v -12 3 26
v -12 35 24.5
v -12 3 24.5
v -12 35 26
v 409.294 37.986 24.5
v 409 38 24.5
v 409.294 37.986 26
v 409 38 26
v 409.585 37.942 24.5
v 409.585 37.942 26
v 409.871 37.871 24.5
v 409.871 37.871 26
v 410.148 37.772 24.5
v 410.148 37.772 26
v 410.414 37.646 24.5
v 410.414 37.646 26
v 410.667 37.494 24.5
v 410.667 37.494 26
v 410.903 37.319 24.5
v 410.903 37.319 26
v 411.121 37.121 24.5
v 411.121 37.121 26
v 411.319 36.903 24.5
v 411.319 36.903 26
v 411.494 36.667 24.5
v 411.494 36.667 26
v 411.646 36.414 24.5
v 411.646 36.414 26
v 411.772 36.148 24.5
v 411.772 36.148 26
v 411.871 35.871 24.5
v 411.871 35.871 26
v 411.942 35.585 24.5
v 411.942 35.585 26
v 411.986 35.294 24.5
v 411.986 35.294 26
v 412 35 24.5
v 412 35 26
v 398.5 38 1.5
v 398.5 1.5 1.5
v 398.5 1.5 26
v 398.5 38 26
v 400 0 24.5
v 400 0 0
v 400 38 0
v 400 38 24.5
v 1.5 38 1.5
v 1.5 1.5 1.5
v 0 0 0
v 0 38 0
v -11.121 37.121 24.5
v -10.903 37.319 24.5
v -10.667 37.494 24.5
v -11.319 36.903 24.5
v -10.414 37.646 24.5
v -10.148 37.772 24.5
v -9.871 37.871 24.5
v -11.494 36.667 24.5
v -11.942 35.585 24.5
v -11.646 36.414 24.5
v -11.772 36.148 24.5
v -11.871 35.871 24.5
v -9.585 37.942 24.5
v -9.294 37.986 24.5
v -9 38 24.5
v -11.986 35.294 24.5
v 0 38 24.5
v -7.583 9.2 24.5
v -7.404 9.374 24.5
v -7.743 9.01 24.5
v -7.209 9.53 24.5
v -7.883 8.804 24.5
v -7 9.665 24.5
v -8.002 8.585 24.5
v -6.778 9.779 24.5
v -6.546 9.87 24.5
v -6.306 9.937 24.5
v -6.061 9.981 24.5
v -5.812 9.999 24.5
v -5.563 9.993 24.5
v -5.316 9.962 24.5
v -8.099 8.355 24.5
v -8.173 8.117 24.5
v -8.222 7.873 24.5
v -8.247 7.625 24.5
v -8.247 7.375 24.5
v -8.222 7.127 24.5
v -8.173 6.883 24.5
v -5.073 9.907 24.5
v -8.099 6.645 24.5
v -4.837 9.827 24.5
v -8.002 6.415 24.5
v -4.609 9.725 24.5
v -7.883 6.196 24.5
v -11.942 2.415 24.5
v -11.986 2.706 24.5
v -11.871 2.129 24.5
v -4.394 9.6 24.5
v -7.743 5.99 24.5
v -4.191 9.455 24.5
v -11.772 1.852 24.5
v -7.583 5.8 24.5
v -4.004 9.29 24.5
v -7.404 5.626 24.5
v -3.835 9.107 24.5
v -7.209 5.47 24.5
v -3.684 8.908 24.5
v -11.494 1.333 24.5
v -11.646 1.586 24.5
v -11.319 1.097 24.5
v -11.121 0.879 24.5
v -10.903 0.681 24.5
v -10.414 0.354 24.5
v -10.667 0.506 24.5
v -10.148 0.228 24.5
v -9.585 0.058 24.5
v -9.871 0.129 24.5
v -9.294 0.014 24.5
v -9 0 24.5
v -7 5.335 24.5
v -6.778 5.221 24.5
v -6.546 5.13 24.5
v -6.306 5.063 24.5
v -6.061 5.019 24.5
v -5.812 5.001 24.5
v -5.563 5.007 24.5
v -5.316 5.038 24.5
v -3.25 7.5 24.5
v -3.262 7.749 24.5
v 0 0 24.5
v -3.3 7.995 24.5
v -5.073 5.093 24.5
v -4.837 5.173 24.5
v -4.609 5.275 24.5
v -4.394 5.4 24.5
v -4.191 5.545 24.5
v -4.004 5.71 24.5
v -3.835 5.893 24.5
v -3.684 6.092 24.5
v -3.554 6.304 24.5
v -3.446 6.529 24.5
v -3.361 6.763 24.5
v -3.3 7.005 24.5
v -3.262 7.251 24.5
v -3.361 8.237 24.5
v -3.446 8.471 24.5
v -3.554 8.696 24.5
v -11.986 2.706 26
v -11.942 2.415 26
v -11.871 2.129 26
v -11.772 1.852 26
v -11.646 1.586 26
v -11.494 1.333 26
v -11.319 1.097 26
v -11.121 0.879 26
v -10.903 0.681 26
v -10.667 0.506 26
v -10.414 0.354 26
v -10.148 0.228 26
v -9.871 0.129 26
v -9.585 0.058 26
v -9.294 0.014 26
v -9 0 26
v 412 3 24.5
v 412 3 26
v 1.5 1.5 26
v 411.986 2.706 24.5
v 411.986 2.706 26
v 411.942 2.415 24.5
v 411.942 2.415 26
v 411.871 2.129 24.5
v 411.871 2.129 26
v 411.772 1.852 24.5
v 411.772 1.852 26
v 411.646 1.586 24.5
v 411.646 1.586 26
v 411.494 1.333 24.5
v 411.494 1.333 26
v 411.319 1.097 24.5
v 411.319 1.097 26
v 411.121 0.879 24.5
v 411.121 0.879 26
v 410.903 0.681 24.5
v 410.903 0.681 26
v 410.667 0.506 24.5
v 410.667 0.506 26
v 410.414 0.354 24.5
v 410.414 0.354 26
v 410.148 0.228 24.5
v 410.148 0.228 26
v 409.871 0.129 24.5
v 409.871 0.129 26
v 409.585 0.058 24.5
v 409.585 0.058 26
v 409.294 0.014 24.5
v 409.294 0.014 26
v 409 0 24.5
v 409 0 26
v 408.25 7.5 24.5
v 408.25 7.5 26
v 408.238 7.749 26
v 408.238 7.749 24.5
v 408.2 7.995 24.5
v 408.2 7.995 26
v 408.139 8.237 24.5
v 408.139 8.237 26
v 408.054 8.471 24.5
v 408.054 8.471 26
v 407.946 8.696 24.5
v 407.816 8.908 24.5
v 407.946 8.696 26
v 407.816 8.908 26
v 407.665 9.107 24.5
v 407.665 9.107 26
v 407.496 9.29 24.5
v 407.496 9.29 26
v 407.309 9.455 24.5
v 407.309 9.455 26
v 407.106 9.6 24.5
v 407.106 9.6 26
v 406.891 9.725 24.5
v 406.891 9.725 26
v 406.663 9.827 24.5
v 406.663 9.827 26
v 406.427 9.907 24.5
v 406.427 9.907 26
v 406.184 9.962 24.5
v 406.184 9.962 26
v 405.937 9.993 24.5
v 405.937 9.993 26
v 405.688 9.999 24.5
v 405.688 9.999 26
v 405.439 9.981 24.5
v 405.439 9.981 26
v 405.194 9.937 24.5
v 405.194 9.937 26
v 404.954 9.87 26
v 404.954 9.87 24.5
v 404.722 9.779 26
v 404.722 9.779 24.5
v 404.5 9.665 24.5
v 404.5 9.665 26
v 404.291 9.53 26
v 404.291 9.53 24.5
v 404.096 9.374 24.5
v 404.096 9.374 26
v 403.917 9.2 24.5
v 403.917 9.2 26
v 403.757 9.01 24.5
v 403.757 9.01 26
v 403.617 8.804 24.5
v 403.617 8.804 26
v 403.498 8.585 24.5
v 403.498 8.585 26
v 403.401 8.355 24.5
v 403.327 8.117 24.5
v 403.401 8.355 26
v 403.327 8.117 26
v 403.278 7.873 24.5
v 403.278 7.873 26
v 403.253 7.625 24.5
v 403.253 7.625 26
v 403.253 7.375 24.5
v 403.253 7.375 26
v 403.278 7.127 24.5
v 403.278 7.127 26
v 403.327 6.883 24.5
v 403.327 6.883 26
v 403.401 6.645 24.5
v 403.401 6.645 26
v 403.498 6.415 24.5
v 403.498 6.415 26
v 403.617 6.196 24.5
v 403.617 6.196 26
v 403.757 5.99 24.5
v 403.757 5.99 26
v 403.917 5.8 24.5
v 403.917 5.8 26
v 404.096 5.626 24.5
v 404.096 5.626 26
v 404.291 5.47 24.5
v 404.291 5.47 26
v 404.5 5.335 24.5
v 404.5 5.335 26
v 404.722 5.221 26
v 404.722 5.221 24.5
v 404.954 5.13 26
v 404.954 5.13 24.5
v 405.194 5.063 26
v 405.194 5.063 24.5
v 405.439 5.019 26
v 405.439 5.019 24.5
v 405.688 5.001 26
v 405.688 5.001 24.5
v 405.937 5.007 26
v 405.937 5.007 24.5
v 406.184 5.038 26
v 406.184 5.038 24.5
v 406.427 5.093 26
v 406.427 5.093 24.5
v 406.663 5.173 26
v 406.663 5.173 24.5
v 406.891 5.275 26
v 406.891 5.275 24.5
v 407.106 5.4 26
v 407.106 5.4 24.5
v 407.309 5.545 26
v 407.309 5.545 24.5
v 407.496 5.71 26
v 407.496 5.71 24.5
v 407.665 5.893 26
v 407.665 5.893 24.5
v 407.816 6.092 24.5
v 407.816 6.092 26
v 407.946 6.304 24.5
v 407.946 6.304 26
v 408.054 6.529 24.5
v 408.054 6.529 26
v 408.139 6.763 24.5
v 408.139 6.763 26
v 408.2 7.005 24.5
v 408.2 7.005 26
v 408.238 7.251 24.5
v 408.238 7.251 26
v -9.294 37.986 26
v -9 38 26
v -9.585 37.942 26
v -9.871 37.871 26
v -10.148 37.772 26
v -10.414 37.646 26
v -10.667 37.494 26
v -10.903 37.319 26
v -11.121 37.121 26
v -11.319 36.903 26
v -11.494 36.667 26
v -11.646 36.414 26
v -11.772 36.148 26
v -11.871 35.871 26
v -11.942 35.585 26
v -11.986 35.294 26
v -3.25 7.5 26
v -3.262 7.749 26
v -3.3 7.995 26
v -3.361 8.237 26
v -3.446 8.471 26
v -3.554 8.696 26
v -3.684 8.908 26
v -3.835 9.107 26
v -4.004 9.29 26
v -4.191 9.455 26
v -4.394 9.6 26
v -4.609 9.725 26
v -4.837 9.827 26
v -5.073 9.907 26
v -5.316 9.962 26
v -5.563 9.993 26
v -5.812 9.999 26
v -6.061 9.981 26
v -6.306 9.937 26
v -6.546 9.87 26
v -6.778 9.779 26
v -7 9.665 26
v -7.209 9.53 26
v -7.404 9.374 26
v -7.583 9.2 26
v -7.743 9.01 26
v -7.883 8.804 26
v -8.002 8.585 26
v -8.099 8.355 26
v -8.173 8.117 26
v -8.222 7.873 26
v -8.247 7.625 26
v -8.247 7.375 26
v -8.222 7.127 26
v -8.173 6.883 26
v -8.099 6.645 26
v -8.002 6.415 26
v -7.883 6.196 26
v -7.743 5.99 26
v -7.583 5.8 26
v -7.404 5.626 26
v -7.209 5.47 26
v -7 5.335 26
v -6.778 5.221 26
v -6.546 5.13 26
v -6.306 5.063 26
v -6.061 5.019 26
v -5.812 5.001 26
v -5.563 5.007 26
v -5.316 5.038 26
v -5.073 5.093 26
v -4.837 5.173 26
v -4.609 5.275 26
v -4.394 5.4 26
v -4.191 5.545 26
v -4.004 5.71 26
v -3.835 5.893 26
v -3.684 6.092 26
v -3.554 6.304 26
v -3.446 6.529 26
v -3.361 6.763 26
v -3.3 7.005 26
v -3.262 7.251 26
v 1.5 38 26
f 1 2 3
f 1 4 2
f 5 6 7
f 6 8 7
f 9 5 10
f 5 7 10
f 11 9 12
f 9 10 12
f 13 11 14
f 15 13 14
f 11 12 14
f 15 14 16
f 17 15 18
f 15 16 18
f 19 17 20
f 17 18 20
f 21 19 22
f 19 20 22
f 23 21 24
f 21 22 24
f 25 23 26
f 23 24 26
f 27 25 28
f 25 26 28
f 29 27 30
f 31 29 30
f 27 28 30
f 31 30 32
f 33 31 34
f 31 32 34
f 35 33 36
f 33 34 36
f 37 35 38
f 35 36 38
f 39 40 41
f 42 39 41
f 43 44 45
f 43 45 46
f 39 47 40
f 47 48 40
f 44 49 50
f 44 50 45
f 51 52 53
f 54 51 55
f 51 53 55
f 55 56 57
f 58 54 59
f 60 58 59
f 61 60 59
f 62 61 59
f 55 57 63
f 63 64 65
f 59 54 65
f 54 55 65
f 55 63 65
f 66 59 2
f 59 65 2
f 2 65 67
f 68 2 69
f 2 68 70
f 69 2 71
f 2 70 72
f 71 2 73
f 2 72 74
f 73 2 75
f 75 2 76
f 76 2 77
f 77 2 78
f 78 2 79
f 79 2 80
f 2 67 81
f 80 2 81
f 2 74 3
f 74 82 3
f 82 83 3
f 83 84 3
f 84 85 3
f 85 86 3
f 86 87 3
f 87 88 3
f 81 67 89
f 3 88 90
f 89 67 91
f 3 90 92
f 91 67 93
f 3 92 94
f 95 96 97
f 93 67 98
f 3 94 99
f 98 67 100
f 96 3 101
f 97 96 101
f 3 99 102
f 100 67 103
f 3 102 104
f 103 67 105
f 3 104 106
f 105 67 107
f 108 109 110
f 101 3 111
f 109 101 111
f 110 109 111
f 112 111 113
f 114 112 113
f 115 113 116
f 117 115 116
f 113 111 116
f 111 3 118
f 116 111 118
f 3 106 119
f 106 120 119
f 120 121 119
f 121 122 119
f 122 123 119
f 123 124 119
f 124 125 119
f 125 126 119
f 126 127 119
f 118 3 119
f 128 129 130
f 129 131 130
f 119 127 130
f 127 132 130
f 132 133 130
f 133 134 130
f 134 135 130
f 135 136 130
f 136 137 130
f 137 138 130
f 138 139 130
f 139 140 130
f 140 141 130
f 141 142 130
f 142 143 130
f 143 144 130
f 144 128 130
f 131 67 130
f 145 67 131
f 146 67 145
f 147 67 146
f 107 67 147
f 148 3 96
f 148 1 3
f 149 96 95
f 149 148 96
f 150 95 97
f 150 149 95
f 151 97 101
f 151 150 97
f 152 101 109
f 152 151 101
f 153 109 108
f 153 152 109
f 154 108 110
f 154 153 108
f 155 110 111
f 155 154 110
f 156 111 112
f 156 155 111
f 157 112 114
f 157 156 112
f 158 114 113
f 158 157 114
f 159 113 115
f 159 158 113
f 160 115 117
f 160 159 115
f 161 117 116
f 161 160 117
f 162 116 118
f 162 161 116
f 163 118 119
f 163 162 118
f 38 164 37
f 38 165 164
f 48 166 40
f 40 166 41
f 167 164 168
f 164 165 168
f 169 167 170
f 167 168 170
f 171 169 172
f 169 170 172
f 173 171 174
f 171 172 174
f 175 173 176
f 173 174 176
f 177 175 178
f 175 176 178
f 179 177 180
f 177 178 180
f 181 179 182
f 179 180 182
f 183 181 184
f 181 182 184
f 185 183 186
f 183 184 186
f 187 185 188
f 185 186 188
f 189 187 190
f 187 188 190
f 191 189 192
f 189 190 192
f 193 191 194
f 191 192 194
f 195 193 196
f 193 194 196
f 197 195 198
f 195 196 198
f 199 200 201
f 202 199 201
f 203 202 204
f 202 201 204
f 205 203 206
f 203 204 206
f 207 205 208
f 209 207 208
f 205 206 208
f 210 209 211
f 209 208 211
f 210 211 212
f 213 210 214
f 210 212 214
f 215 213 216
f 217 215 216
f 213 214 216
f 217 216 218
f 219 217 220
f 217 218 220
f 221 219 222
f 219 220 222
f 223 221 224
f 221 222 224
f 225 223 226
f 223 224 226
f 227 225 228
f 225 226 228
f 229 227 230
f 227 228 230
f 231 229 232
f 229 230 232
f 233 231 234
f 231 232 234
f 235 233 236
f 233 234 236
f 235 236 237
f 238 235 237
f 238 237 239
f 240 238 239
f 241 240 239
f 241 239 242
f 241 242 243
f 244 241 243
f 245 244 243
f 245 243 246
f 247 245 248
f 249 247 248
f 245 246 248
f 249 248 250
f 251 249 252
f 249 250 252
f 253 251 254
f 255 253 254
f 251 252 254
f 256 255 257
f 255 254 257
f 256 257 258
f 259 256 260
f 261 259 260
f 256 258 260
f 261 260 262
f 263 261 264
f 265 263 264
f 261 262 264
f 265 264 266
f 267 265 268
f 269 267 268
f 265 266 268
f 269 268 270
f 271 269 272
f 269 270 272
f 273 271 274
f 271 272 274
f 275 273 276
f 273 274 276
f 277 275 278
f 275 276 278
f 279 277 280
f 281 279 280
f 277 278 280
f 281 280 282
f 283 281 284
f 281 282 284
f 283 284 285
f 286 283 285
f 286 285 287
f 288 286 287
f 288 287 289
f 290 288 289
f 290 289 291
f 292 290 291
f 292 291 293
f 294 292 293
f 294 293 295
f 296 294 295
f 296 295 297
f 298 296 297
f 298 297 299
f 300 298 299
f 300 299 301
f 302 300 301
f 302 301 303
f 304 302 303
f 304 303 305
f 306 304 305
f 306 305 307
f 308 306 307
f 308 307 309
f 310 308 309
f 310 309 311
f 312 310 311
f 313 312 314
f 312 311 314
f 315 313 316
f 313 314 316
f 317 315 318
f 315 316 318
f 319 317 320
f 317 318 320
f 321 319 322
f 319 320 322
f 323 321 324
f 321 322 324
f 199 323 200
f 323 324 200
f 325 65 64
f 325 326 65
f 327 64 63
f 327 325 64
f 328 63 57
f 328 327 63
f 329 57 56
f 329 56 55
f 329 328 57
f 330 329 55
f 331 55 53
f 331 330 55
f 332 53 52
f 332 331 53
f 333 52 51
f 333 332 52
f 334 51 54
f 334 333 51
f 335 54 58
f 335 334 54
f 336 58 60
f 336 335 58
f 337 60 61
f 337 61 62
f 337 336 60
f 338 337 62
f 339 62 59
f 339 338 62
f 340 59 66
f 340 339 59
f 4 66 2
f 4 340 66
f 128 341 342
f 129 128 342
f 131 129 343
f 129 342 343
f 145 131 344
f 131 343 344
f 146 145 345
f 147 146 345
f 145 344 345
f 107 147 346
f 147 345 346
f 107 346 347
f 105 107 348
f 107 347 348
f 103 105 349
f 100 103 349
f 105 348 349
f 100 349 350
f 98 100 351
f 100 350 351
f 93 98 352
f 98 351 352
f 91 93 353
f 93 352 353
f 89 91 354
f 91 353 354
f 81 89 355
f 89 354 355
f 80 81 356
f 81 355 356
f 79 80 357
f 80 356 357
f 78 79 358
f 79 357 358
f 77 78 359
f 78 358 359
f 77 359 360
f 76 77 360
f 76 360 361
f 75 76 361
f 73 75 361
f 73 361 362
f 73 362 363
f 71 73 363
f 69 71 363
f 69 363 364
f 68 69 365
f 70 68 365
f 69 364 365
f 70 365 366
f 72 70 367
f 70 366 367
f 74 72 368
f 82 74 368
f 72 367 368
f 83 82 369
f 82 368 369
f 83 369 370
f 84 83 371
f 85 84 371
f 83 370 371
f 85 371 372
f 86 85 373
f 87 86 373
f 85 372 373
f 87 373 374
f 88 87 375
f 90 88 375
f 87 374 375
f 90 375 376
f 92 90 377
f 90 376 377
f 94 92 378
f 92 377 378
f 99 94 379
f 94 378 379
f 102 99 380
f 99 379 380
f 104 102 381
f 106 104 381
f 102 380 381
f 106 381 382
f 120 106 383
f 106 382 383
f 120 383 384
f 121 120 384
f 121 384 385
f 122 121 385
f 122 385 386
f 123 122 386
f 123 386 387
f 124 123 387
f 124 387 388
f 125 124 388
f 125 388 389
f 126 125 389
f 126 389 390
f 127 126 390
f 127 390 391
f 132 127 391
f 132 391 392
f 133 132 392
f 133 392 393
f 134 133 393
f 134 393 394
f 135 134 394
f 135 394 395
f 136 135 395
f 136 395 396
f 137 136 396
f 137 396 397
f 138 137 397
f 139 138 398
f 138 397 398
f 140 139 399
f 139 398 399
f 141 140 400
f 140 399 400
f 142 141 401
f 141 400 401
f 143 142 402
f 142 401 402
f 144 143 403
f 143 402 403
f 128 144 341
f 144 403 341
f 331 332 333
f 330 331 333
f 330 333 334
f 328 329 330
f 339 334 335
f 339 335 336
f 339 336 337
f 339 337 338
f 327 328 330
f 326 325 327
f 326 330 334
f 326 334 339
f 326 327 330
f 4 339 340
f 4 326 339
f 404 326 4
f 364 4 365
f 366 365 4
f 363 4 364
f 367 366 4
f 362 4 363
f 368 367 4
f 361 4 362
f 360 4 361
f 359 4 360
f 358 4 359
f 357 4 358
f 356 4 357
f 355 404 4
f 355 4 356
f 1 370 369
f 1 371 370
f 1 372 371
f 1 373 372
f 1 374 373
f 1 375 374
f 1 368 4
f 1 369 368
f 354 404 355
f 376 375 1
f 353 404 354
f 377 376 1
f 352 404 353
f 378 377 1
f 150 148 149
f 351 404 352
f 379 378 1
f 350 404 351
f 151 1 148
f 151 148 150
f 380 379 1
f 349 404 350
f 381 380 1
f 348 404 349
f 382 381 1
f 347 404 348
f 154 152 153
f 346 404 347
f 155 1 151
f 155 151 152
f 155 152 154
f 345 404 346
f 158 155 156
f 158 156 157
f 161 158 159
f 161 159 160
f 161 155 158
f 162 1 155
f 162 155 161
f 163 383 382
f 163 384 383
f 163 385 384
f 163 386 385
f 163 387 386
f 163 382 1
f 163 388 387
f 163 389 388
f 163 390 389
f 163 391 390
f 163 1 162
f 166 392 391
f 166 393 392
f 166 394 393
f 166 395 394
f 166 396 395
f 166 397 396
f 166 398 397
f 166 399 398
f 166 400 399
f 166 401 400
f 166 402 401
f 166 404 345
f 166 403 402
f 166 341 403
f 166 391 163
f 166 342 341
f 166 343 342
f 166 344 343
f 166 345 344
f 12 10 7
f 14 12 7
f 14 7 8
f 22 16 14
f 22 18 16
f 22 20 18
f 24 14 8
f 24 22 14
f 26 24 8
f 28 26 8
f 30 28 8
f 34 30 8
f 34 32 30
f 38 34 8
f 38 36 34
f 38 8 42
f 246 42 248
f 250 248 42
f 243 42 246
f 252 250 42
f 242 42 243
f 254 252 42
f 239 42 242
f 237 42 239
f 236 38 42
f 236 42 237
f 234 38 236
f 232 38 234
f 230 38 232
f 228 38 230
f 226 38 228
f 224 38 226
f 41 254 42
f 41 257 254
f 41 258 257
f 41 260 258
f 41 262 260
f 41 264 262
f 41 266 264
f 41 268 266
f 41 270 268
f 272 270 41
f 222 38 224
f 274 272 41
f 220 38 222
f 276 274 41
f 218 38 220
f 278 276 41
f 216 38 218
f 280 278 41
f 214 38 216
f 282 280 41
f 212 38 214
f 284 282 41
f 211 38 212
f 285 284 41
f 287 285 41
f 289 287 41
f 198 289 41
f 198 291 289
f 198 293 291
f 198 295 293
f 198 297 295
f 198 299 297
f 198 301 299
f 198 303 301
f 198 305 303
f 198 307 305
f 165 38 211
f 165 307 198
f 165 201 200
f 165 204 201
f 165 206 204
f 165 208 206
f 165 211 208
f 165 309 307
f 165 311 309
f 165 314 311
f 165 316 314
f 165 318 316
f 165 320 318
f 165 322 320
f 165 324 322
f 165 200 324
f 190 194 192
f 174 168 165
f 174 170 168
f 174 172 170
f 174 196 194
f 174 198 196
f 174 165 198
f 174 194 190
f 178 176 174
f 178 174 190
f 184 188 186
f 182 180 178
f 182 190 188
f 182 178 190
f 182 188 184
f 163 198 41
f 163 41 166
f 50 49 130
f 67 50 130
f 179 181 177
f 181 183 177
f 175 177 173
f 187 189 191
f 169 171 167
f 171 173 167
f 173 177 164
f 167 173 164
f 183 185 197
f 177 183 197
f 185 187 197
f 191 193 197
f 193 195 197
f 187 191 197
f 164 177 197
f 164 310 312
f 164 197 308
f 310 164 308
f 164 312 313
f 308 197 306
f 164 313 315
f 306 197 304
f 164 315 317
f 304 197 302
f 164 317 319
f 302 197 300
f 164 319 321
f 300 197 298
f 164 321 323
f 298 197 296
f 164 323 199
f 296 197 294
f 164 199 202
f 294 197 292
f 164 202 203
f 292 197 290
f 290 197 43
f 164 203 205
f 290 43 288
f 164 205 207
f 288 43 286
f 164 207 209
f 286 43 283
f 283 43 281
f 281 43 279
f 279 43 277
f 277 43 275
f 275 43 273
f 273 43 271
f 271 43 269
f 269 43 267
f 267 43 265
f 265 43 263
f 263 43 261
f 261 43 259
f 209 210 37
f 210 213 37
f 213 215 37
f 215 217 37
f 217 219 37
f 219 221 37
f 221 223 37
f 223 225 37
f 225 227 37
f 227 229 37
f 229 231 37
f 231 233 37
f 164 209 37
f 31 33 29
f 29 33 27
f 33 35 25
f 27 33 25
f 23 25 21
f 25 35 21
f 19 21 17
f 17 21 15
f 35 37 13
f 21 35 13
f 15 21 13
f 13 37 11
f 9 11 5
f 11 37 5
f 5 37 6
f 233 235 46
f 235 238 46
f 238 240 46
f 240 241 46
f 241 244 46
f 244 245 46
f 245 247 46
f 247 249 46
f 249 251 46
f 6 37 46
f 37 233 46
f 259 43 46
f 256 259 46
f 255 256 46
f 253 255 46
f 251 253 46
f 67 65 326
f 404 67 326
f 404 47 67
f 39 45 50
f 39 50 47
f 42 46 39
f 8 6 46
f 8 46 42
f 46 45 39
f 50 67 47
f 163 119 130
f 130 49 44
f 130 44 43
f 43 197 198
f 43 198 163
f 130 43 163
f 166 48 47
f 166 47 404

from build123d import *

# Parameters (mm, degrees)
F0_W     = 400
F0_H     = 26
F1_DEPTH = 38
F2_T     = -1.5
F3_W     = 38
F3_H     = 1.5
F4_DEPTH = 12
F5_W     = 38
F5_H     = 1.5
F6_DEPTH = 12
F7_R     = 2.5
F8_DEPTH = 1.5
F9_R     = 3


with BuildPart() as f1:
    # F0 (on Front) → F1 (new body)
    with BuildSketch(Plane.XZ):
        with Locations((200, 13)):
            Rectangle(F0_W, F0_H)
    extrude(amount=-F1_DEPTH)

    # F2
    f2_openings = [f1.faces().sort_by_distance(p)[0] for p in [
        (200, 19, 26),
        (200, 38, 13),
    ]]
    offset(amount=F2_T, openings=f2_openings)

    # F3 (on face) → F4 (join)
    with BuildSketch(Plane.YZ.offset(400)):
        with Locations((19, 25.25)):
            Rectangle(F3_W, F3_H)
    extrude(amount=F4_DEPTH)

    # F5 (on face) → F6 (join)
    with BuildSketch(Plane(origin=(0, 0, 0), x_dir=(0, -1, 0), z_dir=(-1, 0, 0))):
        with Locations((-19, 25.25)):
            Rectangle(F5_W, F5_H)
    extrude(amount=F6_DEPTH)

    # F7 (on face) → F8 (cut, through all)
    with BuildSketch(Plane.XY.offset(26)):
        with Locations((405.75, 7.5)):
            Circle(F7_R)
        with Locations((-5.75, 7.5)):
            Circle(F7_R)
    extrude(amount=-F8_DEPTH, mode=Mode.SUBTRACT)

    # F9
    f9_edges = [f1.edges().sort_by_distance(p)[0] for p in [
        (-12, 0, 25.25),
        (-12, 38, 25.25),
        (412, 0, 25.25),
        (412, 38, 25.25),
    ]]
    fillet(f9_edges, radius=F9_R)


solid = f1.part
